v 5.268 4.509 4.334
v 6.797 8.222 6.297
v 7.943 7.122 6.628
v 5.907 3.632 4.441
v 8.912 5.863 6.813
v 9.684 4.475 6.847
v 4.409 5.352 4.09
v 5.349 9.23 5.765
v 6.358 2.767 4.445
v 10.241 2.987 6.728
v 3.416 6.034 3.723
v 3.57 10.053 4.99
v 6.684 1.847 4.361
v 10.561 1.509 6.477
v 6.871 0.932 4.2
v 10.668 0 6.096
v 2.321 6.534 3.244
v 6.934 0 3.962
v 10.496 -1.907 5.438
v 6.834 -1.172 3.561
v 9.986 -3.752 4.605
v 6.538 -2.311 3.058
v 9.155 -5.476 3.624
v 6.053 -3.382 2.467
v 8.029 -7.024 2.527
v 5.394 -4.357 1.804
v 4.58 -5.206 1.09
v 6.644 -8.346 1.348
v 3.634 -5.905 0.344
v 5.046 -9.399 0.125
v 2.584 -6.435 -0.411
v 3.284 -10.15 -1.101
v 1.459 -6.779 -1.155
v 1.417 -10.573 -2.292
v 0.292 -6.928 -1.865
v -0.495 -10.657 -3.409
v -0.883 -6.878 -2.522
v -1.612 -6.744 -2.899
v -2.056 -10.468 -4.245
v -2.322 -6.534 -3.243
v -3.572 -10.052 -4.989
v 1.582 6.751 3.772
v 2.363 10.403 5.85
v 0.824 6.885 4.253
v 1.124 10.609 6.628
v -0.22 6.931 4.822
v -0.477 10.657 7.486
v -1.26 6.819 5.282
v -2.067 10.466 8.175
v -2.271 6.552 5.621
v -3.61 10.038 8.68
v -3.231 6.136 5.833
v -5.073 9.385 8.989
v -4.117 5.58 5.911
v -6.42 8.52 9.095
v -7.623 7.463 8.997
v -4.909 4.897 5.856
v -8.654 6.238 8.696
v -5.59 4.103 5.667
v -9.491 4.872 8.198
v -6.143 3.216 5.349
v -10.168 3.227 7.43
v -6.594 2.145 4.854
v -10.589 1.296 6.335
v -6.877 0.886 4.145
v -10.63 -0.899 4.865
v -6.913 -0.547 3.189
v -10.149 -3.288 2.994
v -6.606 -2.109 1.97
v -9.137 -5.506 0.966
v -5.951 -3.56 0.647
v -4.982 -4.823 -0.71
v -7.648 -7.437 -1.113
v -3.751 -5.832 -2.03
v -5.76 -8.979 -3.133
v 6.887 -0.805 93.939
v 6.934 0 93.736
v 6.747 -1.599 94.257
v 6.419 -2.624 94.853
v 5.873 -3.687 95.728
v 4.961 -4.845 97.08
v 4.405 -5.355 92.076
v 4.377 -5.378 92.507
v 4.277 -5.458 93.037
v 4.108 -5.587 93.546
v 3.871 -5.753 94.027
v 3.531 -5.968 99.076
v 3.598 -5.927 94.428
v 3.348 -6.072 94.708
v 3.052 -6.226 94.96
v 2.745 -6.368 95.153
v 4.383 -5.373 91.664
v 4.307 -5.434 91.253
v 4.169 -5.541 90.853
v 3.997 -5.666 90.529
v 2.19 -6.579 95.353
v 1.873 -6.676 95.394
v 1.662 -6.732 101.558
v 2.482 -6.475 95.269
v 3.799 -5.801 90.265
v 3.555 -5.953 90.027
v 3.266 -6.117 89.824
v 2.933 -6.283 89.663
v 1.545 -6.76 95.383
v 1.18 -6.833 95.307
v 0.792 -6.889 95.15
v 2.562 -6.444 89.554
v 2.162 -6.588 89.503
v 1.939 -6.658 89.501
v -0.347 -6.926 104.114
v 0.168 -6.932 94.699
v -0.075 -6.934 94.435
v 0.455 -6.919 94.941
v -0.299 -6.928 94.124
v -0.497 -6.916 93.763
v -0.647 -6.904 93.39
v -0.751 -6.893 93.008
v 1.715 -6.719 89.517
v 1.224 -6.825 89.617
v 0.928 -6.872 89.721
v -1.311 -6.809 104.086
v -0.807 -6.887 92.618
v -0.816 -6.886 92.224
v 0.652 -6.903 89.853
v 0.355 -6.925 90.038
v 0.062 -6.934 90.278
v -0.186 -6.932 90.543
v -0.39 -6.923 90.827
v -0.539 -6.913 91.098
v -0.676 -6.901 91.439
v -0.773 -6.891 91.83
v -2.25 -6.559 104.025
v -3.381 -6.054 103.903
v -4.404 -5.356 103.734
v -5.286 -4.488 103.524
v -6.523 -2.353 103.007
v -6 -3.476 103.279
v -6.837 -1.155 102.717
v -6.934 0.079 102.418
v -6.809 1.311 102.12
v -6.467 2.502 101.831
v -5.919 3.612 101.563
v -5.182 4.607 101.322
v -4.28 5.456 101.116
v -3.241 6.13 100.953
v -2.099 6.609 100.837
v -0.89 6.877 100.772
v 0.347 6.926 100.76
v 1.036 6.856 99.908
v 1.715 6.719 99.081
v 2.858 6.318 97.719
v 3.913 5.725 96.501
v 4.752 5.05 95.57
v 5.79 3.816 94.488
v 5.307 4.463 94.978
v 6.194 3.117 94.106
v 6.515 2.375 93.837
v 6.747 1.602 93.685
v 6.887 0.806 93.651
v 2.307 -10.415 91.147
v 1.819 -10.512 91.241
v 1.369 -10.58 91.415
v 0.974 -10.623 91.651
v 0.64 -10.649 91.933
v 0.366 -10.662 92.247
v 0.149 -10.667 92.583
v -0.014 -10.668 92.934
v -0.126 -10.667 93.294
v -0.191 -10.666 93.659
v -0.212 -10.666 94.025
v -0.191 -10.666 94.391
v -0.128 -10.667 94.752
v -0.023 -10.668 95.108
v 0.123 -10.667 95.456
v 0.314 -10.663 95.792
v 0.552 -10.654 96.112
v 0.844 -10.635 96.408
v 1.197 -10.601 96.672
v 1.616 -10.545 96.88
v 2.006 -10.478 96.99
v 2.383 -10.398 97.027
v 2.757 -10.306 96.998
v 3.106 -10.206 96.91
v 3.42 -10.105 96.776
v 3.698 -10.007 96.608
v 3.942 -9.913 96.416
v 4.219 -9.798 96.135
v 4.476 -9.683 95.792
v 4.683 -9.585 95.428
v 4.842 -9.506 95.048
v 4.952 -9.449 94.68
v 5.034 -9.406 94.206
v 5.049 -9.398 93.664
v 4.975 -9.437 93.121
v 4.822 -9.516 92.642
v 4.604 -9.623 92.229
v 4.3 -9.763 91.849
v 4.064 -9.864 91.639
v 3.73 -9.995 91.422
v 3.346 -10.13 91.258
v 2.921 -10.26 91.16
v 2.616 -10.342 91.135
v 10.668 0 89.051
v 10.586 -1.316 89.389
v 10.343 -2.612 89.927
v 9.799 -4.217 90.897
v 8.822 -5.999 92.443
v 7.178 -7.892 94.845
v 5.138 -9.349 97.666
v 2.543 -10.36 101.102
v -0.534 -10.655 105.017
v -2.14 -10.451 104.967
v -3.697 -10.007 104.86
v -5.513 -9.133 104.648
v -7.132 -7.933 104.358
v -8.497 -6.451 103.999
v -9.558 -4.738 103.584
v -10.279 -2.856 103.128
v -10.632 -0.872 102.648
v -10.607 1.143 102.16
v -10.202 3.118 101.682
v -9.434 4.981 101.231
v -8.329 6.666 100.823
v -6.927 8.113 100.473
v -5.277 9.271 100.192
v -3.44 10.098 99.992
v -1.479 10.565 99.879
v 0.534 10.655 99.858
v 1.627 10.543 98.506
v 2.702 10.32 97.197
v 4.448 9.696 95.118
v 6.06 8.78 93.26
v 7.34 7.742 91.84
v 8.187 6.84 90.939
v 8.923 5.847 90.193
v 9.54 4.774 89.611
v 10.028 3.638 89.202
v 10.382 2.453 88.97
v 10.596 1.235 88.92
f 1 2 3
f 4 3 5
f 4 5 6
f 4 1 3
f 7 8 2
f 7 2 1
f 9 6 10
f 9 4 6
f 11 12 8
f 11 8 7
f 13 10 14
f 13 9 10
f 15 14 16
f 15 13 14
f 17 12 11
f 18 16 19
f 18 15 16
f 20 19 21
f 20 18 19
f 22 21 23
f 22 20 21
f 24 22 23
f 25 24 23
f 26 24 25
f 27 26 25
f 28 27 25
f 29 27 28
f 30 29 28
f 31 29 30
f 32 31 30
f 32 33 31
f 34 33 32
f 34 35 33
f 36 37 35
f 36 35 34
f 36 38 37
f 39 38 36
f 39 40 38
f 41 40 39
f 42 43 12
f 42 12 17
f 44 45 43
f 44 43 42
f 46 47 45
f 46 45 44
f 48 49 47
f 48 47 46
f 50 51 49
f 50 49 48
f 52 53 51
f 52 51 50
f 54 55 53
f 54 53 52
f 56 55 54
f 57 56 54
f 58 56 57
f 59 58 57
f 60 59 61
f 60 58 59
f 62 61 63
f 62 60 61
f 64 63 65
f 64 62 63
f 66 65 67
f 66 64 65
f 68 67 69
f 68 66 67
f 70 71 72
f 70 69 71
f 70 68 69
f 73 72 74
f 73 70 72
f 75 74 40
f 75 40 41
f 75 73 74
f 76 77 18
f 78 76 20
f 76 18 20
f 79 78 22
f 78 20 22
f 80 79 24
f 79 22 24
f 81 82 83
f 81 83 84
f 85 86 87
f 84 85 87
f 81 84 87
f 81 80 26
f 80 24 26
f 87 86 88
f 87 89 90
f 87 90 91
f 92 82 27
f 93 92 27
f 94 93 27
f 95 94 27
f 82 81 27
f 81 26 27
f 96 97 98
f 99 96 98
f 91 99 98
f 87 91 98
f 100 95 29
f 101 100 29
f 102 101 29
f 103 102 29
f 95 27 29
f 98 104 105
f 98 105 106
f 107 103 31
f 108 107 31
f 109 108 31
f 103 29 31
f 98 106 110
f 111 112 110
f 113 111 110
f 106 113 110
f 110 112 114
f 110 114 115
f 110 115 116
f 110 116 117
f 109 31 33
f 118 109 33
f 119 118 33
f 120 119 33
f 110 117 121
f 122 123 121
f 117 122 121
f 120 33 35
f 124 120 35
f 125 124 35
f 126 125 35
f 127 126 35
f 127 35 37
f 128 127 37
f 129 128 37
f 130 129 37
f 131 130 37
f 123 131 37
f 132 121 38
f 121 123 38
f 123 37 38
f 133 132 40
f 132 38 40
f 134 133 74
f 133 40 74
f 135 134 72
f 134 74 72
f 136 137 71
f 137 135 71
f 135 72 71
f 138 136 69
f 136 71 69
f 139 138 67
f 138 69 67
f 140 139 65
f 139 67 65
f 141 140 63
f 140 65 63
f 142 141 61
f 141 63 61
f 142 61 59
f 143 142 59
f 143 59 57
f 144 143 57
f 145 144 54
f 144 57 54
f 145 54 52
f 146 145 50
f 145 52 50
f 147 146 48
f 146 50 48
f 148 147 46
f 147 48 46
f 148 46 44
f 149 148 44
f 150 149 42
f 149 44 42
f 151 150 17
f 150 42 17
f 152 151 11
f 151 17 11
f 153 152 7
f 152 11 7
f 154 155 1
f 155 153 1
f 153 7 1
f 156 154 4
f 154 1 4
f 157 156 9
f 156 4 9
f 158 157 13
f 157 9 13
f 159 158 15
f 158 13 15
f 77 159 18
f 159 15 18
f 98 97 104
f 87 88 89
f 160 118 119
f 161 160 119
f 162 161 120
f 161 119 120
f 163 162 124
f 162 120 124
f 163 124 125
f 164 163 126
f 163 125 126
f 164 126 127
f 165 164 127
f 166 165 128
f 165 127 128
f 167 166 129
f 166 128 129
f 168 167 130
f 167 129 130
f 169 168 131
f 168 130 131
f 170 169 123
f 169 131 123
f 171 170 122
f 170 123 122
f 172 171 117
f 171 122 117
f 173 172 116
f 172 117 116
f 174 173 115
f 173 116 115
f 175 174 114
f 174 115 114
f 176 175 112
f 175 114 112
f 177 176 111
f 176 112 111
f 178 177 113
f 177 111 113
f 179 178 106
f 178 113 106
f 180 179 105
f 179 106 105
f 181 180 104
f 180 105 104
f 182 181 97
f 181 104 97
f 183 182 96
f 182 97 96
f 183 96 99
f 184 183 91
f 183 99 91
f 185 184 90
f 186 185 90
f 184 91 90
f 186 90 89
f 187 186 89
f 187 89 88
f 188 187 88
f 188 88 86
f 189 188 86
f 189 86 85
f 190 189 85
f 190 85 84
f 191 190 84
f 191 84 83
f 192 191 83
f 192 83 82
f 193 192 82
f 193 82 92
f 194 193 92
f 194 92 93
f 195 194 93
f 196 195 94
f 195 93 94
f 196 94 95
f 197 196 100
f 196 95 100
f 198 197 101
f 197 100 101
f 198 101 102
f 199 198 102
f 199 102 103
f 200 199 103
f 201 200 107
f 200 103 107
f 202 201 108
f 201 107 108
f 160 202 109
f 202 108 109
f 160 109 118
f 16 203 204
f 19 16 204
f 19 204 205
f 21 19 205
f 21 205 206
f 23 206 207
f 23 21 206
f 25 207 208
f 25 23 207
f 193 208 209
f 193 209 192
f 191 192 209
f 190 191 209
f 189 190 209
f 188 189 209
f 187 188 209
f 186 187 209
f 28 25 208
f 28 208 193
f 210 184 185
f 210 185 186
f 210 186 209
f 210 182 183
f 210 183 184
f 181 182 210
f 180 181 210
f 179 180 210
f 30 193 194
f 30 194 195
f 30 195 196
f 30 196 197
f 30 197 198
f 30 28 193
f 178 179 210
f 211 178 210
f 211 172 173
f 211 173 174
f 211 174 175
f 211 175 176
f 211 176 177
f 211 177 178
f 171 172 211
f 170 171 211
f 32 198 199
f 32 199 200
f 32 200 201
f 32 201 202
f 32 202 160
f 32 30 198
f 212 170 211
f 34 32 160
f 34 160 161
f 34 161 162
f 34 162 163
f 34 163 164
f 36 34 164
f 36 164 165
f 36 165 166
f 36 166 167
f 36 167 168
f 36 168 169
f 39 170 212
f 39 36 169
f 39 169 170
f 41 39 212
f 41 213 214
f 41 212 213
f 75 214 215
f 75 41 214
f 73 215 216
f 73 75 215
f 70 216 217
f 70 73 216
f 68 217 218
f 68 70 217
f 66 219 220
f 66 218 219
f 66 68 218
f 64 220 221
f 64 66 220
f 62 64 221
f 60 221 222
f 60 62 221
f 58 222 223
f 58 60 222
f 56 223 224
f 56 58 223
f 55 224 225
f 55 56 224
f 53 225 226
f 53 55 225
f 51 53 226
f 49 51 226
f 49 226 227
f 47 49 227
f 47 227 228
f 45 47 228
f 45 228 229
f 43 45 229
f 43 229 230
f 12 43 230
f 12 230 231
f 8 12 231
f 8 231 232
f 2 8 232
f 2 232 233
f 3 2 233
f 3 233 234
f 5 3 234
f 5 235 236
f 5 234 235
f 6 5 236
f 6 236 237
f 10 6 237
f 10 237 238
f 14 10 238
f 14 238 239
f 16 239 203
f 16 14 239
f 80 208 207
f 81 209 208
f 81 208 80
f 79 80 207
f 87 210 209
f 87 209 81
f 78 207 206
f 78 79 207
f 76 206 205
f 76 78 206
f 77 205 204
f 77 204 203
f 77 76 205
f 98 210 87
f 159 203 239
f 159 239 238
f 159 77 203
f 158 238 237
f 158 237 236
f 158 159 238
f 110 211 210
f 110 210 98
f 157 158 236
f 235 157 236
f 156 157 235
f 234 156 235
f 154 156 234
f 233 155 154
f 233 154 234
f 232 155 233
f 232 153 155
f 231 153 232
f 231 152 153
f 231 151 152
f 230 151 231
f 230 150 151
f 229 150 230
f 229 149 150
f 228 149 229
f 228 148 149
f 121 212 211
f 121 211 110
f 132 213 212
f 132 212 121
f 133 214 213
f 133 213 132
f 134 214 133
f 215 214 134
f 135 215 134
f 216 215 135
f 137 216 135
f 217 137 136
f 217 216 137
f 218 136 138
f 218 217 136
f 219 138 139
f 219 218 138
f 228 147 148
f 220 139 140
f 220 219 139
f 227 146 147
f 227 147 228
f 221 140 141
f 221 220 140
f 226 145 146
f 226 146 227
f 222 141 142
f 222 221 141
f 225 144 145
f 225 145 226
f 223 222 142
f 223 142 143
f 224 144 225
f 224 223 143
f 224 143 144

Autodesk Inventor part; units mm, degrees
ref_plane "Start Plane" through (0, 0, -4.9897) normal (0, 0, 1) x (1, 0, 0)
ref_plane "End Plane" through (0, 0, 105.0166) normal (0, 0, 1) x (1, 0, 0)
sketch "Sketch" plane through (0, 0, 0) normal (0, 0, 1) x (1, 0, 0)
  circle A0 centre (0, 0) radius 6.9342
  circle A1 centre (0, 0) radius 10.668
  dimension "d0" = 21.336
  dimension "d1" = 3.7338
extrude "Body" add sketch "Sketch" along normal up to surface (110.0063 mm away) from surface at -4.9897
sketch "Sketch3" plane through (0, 0, 0) normal (0, 0, 1) x (1, 0, 0)
  line L0 (0, 0) -> (10, 0)
ref_plane "Work Plane3" through (0, 0, 0) normal (0, -1, 0) x (1, 0, 0)
sketch "Sketch4" plane through (0, 0, 0) normal (0, -1, 0) x (1, 0, 0)
  line L0 (-2, -4.9897) -> (12, -4.9897)
  line L1 (-2, 105.0166) -> (12, 105.0166)
  dimension "d7" = 110.0063
ref_plane "Work Plane4" through (-9.4897, -4.8737, -6.8509) normal (0.4807, 0.2469, -0.8414) x (-0.4571, -0.7483, -0.4807)
split "Split1" plane through (-9.4897, -4.8737, -6.8509) removes the side toward (0.4807, 0.2469, -0.8414)
ref_plane "Work Plane5" through (6.4449, -8.5011, -9.0952) normal (-0.392, 0.517, -0.761) x (0.3573, 0.8478, 0.392)
split "Split2" plane through (6.4449, -8.5011, -9.0952) removes the side toward (-0.392, 0.517, -0.761)
ref_plane "Work Plane6" through (-10.5607, -1.5089, 115.9586) normal (0.7772, 0.111, 0.6194) x (0.627, -0.0533, -0.7772)
split "Split3" plane through (-10.5607, -1.5089, 115.9586) removes the side toward (0.7772, 0.111, 0.6194)
ref_plane "Work Plane7" through (0, -10.668, 105.0198) normal (0, 0.2353, 0.9719) x (1, 0, 0)
split "Split4" plane through (0, -10.668, 105.0198) removes the side toward (0, 0.2353, 0.9719)
ref_plane "Work Plane8" through (8.1097, -2.9756, 133.7039) normal (0.1452, -0.9053, 0.3992) x (0.0697, 0.4118, 0.9086)
sketch "Sketch5" plane through (8.1097, -2.9756, 133.7039) normal (0.1452, -0.9053, 0.3992) x (0.0697, 0.4118, 0.9086)
  circle A0 centre (-39.4415, 1.4606) radius 3 projected
  point P0 (-120.8228, -8.7403)
hole "Hole1" at (3.9184, -19.3703, 98.047) direction (-0.1452, 0.9053, -0.3992) diameter 5.4 depth 20 tip angle 118
equation "\"d0\" = G_H"
equation "\"d1\" = G_T"
equation "\"d2\" = G_L"
equation "\"G_H\" = 21.336"
equation "\"G_T\" = 3.7338"
equation "\"G_L\" = 110.00626"
equation "\"G_OFFSET_START\" = 4.98966"
equation "\"G_OFFSET_END\" = 2.57893"
equation "\"d4\" = -G_OFFSET_START"
equation "\"d5\" = G_OFFSET_END + B_L"
equation "\"B_L\" = 102.43767"
properties part number "ANSI - 1/2 x 0.147 - 4.331" material "Steel, Mild"
